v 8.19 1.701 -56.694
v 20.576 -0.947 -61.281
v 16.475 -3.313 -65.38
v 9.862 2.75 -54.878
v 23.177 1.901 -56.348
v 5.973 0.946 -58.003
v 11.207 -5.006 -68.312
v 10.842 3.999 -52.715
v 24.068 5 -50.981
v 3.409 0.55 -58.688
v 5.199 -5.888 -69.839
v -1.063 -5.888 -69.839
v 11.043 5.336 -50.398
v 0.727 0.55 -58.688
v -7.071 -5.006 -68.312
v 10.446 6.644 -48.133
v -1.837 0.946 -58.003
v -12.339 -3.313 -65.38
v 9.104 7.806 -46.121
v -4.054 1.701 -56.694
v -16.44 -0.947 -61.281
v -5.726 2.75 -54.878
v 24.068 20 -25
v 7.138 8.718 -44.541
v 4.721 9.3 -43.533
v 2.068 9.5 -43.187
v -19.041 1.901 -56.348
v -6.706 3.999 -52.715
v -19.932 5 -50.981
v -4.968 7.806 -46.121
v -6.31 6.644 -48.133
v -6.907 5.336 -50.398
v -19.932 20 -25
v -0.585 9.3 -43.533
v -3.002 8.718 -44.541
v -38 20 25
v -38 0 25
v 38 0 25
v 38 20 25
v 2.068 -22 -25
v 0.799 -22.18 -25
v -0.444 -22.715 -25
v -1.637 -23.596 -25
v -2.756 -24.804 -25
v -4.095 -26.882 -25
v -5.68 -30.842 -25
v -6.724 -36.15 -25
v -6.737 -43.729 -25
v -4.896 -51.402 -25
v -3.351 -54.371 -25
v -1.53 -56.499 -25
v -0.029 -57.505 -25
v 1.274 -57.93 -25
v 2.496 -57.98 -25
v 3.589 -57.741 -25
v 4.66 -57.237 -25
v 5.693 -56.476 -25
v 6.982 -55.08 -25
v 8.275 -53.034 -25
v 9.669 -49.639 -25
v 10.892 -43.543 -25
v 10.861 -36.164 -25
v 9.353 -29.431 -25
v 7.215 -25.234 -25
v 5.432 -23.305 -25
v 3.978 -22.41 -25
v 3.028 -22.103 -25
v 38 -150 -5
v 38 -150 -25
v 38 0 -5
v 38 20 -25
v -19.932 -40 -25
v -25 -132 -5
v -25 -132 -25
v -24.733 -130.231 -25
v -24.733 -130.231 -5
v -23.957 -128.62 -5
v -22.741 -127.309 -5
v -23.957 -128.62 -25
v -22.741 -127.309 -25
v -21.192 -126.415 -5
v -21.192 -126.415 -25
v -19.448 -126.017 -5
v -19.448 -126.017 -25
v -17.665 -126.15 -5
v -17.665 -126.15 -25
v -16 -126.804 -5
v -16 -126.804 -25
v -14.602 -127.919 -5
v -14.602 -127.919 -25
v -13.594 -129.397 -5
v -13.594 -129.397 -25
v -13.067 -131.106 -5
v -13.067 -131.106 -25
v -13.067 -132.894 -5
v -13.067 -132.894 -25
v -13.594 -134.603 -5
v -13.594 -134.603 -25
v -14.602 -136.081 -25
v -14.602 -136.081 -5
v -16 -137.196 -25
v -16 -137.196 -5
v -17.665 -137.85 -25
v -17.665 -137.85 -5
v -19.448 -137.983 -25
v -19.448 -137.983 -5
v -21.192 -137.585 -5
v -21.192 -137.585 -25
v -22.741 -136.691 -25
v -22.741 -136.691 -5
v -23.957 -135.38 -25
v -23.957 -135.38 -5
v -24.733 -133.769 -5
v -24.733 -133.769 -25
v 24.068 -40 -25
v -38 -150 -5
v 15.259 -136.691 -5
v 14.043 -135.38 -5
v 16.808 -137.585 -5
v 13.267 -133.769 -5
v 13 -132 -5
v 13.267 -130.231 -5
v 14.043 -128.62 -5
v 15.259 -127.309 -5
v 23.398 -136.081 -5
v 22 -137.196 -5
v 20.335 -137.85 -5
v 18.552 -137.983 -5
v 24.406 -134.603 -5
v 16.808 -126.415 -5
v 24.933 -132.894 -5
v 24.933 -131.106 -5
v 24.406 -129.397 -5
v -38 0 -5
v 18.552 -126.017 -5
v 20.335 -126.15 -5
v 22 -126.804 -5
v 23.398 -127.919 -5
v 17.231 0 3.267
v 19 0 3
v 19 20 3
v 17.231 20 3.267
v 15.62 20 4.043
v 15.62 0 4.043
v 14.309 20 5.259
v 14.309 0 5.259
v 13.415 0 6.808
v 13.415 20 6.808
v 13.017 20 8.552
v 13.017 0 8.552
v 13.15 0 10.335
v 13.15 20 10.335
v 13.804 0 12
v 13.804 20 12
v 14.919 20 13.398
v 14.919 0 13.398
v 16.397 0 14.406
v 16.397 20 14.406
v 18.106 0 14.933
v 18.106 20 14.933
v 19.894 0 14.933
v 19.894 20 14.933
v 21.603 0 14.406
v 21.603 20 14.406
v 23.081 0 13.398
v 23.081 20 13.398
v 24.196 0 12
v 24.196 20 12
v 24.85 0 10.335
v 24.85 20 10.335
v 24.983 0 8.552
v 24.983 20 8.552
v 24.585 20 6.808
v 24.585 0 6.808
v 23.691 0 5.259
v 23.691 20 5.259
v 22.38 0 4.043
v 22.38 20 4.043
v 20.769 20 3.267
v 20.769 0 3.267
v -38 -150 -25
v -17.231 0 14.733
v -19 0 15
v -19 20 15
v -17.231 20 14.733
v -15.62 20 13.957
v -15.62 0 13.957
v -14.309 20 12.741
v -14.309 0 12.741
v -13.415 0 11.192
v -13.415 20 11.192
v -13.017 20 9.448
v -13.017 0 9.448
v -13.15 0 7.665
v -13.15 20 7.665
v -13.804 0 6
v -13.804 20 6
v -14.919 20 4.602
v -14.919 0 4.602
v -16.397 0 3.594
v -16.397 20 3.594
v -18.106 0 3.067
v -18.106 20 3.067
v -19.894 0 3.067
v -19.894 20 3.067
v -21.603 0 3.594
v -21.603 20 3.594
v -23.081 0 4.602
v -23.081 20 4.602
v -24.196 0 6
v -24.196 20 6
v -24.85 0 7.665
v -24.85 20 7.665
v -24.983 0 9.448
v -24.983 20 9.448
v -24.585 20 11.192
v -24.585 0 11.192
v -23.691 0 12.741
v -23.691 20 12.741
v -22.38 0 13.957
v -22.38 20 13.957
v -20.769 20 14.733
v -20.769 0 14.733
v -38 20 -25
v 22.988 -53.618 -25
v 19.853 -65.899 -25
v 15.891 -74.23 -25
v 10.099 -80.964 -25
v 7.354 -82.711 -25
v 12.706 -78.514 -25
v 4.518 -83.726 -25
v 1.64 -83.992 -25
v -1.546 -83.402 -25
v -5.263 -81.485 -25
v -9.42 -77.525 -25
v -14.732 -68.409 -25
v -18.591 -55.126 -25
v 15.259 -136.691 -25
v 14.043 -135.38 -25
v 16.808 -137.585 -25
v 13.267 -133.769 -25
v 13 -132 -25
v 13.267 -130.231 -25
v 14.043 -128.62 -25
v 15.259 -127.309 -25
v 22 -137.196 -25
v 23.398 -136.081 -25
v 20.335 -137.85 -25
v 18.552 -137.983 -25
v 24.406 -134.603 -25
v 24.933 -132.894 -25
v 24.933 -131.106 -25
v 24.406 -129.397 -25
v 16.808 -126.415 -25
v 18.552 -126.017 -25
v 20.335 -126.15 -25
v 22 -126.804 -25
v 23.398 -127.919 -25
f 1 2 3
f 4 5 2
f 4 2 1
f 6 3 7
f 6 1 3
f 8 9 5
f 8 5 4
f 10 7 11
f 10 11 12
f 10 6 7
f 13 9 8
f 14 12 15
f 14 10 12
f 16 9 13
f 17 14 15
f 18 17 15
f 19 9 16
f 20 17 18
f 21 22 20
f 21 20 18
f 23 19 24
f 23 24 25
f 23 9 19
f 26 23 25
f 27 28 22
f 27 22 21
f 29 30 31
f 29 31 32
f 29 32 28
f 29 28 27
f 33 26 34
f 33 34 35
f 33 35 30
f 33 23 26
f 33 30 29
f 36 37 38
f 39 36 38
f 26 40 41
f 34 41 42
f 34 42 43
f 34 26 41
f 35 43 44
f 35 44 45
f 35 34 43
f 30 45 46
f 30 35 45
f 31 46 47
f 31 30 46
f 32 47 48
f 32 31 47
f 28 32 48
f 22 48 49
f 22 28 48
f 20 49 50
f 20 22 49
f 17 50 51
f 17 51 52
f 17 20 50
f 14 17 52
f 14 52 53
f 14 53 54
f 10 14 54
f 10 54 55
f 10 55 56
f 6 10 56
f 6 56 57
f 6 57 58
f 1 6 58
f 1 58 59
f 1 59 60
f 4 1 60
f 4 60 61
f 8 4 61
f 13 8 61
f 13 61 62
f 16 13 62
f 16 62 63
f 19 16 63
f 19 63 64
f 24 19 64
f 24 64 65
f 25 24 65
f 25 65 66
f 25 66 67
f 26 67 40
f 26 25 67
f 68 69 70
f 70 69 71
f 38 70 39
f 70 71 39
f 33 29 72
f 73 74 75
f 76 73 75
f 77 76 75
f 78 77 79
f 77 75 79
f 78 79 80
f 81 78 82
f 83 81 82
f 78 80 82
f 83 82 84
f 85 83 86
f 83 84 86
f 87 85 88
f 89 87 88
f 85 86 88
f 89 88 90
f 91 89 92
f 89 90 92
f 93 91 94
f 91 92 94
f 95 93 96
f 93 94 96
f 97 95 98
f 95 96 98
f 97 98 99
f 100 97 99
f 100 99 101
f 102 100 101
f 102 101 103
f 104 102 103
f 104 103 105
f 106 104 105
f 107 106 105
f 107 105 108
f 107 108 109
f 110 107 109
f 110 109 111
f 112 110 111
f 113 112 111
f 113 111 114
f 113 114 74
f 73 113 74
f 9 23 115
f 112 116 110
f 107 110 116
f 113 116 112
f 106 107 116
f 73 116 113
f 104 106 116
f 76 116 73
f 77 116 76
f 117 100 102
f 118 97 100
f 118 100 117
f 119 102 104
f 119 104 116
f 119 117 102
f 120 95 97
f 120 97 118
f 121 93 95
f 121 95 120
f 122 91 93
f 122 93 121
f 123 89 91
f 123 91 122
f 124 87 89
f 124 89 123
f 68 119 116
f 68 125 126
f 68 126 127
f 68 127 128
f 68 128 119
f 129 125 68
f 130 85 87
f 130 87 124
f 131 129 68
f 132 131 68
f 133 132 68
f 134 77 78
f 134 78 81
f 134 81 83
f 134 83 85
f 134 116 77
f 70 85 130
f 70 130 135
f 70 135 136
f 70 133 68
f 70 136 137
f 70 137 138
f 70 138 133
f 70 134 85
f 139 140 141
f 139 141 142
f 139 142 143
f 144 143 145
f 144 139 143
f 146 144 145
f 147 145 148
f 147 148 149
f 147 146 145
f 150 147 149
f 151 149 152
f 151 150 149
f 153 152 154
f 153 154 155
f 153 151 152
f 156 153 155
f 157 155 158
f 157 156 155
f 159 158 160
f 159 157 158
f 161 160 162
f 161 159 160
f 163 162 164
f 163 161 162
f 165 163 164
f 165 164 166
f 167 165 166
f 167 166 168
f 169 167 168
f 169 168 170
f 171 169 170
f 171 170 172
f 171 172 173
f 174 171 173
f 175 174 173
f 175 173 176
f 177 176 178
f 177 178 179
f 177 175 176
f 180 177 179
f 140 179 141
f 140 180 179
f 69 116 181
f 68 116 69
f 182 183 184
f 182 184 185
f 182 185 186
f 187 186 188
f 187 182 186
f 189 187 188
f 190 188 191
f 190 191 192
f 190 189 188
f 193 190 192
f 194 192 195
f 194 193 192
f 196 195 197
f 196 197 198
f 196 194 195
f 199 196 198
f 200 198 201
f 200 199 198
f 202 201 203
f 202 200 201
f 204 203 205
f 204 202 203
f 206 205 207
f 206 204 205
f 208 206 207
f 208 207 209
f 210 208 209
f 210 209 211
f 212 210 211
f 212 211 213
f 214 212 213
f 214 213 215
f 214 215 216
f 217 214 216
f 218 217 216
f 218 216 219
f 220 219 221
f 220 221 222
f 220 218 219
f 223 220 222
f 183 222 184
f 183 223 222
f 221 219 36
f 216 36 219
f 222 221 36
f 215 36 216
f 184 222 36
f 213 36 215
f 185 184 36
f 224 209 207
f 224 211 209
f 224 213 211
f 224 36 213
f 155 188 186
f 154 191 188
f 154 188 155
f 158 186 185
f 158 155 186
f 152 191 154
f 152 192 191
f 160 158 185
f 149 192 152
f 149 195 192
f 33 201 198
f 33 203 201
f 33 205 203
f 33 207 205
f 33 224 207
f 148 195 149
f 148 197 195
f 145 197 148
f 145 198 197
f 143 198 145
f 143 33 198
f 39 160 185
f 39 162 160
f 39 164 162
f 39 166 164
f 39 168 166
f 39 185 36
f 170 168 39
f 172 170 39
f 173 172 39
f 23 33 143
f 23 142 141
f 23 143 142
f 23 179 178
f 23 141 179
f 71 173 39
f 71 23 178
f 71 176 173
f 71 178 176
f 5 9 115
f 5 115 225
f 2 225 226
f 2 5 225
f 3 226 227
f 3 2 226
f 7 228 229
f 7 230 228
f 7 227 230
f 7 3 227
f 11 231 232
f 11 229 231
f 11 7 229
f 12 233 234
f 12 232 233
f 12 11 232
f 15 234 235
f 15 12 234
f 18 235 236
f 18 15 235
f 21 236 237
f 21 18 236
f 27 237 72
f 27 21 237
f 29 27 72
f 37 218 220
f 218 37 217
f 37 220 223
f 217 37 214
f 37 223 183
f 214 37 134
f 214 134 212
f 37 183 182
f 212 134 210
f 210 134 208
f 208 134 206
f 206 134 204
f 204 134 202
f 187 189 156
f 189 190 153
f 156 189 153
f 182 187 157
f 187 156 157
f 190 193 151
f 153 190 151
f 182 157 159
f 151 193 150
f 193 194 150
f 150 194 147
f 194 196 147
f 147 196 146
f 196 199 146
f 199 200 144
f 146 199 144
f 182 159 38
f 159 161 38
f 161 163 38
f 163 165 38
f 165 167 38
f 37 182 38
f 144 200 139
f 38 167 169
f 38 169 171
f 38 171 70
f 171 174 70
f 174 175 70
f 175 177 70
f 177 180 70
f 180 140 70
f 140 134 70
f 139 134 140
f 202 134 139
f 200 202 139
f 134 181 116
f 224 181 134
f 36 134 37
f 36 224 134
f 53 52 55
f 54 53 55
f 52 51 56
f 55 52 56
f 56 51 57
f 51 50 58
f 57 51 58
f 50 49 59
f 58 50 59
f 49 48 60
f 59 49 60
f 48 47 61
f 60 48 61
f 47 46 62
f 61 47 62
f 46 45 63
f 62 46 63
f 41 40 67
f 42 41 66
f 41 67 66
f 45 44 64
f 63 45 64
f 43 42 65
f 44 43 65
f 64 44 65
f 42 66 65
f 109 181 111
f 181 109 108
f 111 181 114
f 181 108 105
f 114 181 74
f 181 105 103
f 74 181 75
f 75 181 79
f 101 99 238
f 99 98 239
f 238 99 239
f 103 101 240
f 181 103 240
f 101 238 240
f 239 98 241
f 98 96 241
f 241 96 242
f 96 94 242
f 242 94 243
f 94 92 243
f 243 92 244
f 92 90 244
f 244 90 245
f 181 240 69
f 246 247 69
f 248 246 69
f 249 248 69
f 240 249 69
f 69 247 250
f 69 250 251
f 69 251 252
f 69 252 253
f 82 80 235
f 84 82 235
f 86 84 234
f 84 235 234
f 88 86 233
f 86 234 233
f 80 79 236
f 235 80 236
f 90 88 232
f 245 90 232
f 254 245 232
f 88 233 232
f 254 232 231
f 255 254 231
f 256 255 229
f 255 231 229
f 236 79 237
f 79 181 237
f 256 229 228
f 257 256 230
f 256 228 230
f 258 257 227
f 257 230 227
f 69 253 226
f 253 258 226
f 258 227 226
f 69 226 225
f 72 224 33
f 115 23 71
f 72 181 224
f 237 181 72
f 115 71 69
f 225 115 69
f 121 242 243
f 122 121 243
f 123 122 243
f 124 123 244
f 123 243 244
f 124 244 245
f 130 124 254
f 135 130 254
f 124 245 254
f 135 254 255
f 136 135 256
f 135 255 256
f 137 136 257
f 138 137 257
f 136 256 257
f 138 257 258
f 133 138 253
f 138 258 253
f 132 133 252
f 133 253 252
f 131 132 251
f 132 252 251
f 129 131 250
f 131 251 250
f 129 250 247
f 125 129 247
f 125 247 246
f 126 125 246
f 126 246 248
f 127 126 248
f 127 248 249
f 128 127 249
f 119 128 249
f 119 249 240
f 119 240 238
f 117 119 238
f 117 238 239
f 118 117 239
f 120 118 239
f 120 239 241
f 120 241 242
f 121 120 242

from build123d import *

# Parameters (mm, degrees)
SKETCH1_W           = 76
SKETCH1_H           = 50
SKETCH1_R           = 6
BOSS_EXTRUDE1_DEPTH = 20
SKETCH2_W           = 76
SKETCH2_H           = 20
BOSS_EXTRUDE2_DEPTH = 150
SKETCH3_R           = 6
CUT_EXTRUDE1_DEPTH  = 150
BOSS_EXTRUDE3_REACH = 186.259
SKETCH5_R           = 9


with BuildPart() as part:
    # Sketch1 → Boss-Extrude1 (new body)
    with BuildSketch(Plane(origin=(0, 0, 0), x_dir=(1, 0, 0), z_dir=(0, 1, 0))):
        Rectangle(SKETCH1_W, SKETCH1_H)
        with Locations(Location((-19, -9, 0), (0, 0, 270))):
            Circle(SKETCH1_R, mode=Mode.SUBTRACT)
        with Locations(Location((19, -9, 0), (0, 0, 90))):
            Circle(SKETCH1_R, mode=Mode.SUBTRACT)
    extrude(amount=BOSS_EXTRUDE1_DEPTH)

    # Sketch2 → Boss-Extrude2 (add)
    with BuildSketch(Plane.XZ):
        with Locations((0, -15)):
            Rectangle(SKETCH2_W, SKETCH2_H)
    extrude(amount=BOSS_EXTRUDE2_DEPTH)

    # Sketch3 → Cut-Extrude1 (cut)
    with BuildSketch(Plane(origin=(0, 0, -25), x_dir=(-1, 0, 0), z_dir=(0, 0, -1))):
        with Locations((-19, -132)):
            Circle(SKETCH3_R)
        with Locations((19, -132)):
            Circle(SKETCH3_R)
    extrude(amount=-CUT_EXTRUDE1_DEPTH, mode=Mode.SUBTRACT)

    # Sketch5 → Boss-Extrude3 (add, up to next)
    with BuildSketch(Plane(origin=(0, 25.825317547, -14.910254038), x_dir=(1, 0, 0), z_dir=(0, -0.8660254037844399, 0.4999999999999977)), mode=Mode.PRIVATE) as boss_extrude3_sk1:
        with BuildLine():
            Line((-19.931985631, -11.650635095), (24.068014369, -11.650635095))
            Line((24.068014369, -11.650635095), (24.068014369, -41.650635095))
            ThreePointArc((24.068014369, -41.650635095), (2.068014369, -63.650635095), (-19.931985631, -41.650635095))
            Line((-19.931985631, -41.650635095), (-19.931985631, -11.650635095))
        make_face()
        with Locations(Location((2.068014369, -41.650635095, 0), (0, 0, 90))):
            Circle(SKETCH5_R, mode=Mode.SUBTRACT)
    boss_extrude3_tool1 = extrude(boss_extrude3_sk1.sketch, amount=BOSS_EXTRUDE3_REACH, mode=Mode.PRIVATE) - part.part
    add(boss_extrude3_tool1.solids().sort_by_distance((-19.25081, 12.5, -37.990381))[0])


solid = part.part
